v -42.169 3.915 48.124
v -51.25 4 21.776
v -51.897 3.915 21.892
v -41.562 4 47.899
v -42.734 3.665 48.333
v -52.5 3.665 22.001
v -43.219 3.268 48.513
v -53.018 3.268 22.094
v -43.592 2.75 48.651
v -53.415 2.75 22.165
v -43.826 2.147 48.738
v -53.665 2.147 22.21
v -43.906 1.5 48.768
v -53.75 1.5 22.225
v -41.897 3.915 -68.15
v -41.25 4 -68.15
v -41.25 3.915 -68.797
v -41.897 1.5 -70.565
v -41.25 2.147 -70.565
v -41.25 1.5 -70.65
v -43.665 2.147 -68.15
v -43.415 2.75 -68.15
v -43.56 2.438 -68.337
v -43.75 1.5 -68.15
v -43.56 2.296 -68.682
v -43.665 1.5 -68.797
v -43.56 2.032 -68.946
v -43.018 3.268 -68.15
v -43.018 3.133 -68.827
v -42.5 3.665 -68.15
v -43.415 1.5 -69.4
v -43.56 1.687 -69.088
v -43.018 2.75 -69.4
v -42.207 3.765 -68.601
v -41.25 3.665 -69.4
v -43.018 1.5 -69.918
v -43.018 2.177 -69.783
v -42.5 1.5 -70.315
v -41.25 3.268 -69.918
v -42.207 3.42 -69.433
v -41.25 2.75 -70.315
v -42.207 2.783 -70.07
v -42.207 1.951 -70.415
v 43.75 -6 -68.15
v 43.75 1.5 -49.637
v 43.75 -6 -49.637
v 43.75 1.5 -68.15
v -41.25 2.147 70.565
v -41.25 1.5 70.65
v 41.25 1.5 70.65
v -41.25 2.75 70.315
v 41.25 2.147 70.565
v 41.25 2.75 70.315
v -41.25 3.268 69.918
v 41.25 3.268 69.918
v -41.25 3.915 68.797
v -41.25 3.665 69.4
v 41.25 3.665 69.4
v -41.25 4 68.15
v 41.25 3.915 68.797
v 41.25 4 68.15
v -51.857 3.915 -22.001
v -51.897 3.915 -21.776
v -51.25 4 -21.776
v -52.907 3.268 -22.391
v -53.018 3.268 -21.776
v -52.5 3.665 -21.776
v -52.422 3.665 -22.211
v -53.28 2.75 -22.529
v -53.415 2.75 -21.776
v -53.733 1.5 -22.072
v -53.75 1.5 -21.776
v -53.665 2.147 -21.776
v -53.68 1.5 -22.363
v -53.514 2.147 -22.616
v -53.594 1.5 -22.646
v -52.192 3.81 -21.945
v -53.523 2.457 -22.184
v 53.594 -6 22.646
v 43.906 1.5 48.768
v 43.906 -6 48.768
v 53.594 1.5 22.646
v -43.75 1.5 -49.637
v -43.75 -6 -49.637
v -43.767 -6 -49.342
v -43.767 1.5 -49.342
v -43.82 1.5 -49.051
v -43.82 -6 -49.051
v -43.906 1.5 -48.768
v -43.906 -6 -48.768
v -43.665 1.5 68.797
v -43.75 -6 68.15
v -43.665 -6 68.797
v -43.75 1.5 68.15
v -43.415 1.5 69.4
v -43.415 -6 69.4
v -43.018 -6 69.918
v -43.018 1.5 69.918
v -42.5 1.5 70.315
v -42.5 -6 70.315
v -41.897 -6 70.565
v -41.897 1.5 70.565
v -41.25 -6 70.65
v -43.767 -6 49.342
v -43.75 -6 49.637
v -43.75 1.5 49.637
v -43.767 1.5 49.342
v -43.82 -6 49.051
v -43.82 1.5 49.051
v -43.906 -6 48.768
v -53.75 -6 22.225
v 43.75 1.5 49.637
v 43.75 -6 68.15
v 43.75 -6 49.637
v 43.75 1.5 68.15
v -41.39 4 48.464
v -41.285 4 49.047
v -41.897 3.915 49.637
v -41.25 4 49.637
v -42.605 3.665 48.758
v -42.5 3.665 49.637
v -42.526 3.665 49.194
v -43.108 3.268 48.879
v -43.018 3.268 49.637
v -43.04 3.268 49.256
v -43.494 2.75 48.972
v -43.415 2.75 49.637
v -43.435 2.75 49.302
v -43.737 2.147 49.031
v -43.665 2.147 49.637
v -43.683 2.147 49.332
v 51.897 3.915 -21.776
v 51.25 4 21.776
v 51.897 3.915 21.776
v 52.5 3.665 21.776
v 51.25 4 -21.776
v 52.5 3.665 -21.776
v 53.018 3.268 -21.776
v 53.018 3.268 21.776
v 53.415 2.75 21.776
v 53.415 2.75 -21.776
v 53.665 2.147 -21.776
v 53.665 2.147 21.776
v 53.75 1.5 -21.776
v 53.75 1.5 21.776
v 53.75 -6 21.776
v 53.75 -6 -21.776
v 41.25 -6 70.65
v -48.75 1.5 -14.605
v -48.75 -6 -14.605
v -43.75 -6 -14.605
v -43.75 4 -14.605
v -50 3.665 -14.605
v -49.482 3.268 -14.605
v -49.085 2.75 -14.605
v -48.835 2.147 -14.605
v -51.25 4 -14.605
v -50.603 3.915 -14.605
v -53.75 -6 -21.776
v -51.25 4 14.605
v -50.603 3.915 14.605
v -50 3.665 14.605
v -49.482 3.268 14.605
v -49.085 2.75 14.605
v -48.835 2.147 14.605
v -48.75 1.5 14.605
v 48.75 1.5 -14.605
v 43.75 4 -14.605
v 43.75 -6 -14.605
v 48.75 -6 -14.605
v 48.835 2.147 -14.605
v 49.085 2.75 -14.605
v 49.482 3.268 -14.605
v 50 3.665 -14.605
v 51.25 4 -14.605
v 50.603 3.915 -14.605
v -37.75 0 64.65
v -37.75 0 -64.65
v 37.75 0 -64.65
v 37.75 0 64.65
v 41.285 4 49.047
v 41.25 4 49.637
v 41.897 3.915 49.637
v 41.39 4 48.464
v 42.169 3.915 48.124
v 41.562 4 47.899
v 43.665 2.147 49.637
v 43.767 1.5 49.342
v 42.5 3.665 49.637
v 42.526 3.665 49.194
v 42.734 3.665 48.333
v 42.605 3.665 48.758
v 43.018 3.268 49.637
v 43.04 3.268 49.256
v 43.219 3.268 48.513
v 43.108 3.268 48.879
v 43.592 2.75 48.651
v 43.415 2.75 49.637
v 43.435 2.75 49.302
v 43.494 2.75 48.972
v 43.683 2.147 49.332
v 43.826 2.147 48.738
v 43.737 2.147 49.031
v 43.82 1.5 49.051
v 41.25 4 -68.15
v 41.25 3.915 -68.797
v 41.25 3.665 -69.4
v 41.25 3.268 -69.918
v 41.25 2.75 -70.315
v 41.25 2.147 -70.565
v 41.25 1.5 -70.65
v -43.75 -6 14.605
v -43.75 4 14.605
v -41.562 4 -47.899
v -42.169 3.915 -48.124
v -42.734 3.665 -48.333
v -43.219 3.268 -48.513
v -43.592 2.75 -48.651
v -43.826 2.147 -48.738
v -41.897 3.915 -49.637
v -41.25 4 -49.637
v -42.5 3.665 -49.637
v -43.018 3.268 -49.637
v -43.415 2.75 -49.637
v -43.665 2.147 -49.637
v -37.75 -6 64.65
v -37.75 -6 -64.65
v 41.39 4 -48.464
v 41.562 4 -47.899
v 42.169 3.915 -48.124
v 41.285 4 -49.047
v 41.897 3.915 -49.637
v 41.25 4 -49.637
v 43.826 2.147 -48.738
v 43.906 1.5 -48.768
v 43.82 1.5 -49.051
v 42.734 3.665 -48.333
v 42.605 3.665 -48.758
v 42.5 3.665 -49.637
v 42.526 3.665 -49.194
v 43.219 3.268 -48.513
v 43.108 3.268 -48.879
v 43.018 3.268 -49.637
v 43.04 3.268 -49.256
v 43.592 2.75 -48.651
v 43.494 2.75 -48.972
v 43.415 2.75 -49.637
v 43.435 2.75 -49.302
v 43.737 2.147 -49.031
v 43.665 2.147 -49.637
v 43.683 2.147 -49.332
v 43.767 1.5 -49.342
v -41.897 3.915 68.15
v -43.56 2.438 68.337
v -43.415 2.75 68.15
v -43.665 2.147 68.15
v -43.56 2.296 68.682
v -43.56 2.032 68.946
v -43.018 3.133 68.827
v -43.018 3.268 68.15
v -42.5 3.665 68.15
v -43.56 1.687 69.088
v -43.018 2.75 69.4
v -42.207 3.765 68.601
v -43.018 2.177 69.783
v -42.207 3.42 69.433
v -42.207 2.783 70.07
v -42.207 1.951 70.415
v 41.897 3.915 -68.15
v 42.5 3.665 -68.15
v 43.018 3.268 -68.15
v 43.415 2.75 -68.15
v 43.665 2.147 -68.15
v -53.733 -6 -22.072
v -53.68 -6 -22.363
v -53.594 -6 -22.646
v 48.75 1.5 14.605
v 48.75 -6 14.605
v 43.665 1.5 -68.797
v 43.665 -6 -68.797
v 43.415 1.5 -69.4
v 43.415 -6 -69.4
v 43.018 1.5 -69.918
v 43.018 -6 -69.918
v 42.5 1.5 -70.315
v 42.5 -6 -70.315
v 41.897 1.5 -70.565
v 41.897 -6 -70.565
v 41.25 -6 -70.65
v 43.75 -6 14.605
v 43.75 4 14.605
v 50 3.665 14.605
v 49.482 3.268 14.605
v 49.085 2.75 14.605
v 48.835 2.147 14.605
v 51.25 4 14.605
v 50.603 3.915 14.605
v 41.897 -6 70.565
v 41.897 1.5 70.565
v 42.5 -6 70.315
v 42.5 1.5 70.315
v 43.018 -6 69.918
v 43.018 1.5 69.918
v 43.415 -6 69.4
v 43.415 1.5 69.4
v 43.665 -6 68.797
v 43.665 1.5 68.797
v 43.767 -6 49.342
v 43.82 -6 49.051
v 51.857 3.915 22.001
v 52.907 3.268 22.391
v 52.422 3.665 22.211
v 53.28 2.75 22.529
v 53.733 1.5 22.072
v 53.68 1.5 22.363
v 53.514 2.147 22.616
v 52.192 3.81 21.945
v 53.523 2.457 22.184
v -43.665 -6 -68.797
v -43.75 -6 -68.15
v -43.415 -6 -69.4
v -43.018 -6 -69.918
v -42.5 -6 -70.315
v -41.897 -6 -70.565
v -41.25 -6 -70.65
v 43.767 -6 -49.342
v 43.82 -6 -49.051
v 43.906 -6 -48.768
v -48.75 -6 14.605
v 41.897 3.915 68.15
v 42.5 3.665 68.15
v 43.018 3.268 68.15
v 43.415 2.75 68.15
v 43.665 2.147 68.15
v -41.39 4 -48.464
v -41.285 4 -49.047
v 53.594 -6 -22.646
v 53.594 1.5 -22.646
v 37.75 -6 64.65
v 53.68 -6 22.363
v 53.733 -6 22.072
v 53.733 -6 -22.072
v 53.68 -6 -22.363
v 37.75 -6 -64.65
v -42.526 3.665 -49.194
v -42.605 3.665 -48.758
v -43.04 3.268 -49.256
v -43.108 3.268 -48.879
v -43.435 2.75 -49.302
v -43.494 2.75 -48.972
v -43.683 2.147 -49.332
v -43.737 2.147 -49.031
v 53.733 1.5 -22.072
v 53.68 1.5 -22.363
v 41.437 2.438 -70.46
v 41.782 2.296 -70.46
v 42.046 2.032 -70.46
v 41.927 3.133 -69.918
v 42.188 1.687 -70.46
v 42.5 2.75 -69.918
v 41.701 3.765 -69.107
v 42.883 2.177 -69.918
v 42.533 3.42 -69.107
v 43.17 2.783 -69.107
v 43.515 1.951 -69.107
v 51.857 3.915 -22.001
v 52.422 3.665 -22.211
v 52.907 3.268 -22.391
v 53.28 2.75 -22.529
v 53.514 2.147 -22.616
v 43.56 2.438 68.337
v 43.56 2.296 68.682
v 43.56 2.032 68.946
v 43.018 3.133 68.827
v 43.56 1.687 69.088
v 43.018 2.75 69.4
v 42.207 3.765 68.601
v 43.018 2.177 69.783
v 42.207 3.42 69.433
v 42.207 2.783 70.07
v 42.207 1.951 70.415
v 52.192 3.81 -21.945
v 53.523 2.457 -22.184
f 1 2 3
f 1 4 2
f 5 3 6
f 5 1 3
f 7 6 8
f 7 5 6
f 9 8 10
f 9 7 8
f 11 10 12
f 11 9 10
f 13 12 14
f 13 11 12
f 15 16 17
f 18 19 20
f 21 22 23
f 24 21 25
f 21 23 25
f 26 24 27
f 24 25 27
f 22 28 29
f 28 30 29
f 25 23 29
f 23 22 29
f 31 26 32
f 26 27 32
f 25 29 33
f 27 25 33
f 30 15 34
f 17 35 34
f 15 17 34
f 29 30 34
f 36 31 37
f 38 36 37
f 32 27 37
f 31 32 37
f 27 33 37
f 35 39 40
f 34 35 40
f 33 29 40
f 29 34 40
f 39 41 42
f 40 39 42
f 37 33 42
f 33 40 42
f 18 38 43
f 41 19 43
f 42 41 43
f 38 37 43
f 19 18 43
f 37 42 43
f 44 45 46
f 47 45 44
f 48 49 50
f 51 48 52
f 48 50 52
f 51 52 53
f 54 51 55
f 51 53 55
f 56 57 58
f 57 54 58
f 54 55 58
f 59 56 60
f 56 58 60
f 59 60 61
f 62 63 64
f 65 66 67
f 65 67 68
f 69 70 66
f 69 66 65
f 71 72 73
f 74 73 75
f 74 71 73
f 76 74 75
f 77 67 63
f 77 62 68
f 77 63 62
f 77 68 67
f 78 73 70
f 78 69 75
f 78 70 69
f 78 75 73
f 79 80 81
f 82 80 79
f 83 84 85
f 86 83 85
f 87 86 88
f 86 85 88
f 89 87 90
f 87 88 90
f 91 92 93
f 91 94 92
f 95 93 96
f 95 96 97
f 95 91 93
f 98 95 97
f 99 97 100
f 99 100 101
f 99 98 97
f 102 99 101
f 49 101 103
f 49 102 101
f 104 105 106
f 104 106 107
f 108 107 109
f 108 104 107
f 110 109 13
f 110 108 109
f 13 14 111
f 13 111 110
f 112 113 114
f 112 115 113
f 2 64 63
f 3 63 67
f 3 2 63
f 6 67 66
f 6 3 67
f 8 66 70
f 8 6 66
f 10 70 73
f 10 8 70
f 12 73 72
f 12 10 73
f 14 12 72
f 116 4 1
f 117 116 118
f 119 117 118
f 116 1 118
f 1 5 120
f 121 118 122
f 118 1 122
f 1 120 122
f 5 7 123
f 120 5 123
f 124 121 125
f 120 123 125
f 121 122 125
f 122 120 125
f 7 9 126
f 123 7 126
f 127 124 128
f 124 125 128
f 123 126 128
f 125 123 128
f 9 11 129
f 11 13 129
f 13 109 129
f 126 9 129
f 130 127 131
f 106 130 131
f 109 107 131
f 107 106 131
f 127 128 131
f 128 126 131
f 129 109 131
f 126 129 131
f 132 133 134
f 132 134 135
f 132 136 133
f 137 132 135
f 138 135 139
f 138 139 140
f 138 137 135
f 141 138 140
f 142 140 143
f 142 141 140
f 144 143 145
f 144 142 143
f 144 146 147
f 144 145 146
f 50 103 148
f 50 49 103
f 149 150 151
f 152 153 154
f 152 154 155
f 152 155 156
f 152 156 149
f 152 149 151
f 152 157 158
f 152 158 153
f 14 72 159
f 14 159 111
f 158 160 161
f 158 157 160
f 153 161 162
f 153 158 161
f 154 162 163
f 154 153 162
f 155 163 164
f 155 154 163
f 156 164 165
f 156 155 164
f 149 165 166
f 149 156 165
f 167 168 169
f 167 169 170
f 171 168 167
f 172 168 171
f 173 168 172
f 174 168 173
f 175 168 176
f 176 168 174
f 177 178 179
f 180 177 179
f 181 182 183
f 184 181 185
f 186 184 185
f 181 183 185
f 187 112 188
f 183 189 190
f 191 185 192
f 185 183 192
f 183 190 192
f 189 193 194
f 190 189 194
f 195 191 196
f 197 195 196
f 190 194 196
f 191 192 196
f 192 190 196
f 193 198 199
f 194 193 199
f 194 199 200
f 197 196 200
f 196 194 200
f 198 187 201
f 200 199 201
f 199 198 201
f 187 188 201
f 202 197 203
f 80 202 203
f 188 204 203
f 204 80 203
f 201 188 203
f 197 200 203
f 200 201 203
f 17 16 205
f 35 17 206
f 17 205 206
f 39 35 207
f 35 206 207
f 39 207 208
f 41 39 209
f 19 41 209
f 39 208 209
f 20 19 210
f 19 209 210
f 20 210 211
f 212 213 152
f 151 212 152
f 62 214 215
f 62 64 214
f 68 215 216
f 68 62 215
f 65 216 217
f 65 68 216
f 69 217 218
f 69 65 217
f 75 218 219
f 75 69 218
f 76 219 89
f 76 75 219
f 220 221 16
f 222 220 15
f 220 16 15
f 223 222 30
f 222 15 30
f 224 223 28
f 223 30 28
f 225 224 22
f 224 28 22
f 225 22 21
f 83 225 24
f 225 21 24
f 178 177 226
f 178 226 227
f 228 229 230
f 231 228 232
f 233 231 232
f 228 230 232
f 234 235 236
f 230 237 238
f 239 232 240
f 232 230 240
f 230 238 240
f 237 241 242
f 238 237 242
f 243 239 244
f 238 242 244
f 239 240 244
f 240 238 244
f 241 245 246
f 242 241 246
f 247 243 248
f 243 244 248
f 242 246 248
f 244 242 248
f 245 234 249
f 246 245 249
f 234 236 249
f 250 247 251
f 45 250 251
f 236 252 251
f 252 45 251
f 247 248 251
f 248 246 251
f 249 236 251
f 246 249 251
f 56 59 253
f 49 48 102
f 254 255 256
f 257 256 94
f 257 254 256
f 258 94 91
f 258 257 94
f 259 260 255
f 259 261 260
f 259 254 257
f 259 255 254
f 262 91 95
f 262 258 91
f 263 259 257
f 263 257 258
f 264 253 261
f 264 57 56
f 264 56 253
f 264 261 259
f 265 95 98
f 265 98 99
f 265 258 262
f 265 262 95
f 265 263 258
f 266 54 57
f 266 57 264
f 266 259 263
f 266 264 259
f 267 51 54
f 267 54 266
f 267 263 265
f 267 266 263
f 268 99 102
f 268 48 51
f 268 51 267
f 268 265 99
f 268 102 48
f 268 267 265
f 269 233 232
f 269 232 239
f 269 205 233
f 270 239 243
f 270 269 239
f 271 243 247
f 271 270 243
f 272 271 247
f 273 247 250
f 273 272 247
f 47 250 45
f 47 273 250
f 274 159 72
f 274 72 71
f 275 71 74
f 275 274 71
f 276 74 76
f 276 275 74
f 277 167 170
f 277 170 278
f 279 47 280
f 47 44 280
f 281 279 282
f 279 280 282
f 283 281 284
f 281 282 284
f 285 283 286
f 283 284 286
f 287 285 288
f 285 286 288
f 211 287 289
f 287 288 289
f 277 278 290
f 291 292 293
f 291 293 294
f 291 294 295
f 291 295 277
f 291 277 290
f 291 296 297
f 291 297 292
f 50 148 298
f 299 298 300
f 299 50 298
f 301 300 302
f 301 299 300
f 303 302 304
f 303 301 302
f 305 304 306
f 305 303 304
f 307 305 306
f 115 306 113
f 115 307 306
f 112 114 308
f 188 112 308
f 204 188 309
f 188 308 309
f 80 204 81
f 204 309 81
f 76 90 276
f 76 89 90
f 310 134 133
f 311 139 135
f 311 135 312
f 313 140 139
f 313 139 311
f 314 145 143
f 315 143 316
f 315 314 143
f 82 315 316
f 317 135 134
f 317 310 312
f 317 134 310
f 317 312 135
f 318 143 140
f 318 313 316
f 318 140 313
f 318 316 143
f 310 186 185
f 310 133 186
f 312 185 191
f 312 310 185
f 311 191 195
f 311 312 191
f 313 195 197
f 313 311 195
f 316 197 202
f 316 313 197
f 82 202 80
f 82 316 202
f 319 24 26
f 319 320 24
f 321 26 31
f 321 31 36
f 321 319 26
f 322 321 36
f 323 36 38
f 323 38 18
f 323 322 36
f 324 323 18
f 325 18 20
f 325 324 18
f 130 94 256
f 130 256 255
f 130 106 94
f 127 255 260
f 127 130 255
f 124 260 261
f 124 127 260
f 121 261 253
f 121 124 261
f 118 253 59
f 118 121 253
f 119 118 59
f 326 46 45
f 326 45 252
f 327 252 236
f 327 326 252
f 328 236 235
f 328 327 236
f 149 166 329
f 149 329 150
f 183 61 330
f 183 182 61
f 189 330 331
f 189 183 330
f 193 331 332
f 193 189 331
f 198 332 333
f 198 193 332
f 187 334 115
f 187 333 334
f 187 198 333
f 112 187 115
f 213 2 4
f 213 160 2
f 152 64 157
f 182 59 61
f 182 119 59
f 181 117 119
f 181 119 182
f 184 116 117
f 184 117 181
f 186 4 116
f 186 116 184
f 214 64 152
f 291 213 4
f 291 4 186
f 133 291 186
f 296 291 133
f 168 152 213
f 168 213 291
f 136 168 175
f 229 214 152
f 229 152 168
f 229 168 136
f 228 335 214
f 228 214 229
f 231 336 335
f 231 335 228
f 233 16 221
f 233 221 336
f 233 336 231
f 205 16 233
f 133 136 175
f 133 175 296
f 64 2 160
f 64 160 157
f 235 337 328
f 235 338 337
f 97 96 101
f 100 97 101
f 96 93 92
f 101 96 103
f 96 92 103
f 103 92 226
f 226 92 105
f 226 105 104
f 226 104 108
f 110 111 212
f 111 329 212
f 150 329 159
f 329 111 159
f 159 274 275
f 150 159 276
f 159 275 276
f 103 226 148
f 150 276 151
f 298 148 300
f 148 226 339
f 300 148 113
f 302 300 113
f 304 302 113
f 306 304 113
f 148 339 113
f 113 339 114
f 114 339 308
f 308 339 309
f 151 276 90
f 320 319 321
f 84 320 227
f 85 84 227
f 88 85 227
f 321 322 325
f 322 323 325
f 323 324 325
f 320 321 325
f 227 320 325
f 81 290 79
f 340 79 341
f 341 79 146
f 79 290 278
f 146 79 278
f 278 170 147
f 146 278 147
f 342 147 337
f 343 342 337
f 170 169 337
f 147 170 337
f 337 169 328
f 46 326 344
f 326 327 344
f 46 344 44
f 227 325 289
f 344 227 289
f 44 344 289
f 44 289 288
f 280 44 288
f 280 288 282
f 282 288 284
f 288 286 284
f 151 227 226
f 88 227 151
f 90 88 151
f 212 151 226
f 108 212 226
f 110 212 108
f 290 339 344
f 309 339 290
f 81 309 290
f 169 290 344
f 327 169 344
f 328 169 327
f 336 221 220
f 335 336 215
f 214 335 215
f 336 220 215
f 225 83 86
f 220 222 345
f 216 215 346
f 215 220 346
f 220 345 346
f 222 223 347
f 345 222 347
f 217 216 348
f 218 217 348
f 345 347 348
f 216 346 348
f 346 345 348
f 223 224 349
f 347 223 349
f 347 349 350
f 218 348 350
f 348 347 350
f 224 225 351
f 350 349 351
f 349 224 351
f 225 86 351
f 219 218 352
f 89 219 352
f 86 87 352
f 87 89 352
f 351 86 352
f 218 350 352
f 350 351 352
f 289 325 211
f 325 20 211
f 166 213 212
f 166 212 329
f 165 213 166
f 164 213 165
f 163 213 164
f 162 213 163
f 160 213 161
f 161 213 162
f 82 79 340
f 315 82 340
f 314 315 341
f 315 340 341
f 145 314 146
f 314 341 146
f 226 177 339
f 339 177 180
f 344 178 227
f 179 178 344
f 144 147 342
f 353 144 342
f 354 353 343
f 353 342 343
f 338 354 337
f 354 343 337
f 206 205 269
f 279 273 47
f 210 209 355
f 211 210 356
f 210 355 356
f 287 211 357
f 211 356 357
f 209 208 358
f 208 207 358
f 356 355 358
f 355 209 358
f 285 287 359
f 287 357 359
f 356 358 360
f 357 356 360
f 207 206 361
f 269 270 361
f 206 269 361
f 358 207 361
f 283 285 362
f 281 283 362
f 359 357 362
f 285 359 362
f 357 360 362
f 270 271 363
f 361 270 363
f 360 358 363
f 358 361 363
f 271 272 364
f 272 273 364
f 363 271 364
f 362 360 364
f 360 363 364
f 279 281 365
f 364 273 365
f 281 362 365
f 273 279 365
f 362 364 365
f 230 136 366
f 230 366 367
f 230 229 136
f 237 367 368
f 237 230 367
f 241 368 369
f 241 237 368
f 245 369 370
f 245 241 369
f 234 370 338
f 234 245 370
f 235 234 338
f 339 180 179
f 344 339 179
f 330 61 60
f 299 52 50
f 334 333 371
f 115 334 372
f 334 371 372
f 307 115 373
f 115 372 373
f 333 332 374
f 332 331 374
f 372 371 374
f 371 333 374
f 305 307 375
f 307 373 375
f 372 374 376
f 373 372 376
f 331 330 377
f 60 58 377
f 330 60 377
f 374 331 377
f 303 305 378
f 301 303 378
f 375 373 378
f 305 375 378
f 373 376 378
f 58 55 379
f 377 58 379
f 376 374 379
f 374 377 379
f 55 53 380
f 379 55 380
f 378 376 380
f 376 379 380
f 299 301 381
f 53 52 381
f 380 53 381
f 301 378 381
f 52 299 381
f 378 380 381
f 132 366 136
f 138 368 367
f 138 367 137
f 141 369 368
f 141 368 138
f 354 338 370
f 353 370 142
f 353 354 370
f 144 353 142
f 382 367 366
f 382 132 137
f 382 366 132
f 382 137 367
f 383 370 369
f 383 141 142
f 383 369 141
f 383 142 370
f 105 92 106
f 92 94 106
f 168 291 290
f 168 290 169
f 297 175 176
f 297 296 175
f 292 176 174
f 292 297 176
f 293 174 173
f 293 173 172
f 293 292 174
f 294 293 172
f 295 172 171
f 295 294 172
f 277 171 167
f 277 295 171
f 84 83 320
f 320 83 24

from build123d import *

# Parameters (mm, degrees)
SKETCH1_W           = 87.5
SKETCH1_H           = 141.3
BOSS_EXTRUDE1_DEPTH = 4
SKETCH1_3_W         = 87.5
SKETCH1_3_H         = 141.3
SKETCH1_3_W_2       = 75.5
SKETCH1_3_H_2       = 129.3
BOSS_EXTRUDE2_DEPTH = 6
BOSS_EXTRUDE3_DEPTH = 10
FILLET2_R           = 2.5


with BuildPart() as part:
    # Sketch1 → Boss-Extrude1 (new body)
    with BuildSketch(Plane(origin=(0, 0, 0), x_dir=(1, 0, 0), z_dir=(0, 1, 0))):
        Rectangle(SKETCH1_W, SKETCH1_H)
    extrude(amount=BOSS_EXTRUDE1_DEPTH)

    # Sketch1<3> → Boss-Extrude2 (add)
    with BuildSketch(Plane(origin=(0, 0, 0), x_dir=(1, 0, 0), z_dir=(0, 1, 0))):
        Rectangle(SKETCH1_3_W, SKETCH1_3_H)
        Rectangle(SKETCH1_3_W_2, SKETCH1_3_H_2, mode=Mode.SUBTRACT)
    extrude(amount=-BOSS_EXTRUDE2_DEPTH)

    # Sketch2 → Boss-Extrude3 (add)
    with BuildSketch(Plane(origin=(0, 4, 0), x_dir=(1, 0, 0), z_dir=(0, 1, 0))):
        Polygon((-43.75, 49.188592066), (-53.75, 22.225), (-53.75, -22.225), (-43.75, -49.188592066), (-43.75, -22.225), (-43.75, -14.605), (-48.75, -14.605), (-48.75, 14.605), (-43.75, 14.605), (-43.75, 22.225), align=None)
        Polygon((53.75, 22.225), (43.75, 22.225), (43.75, 14.605), (48.75, 14.605), (48.75, -14.605), (43.75, -14.605), (43.75, -22.225), (43.75, -49.188592066), (53.75, -22.225), align=None)
        Polygon((43.75, 49.188592066), (43.75, 22.225), (53.75, 22.225), align=None)
    extrude(amount=-BOSS_EXTRUDE3_DEPTH)

    # Fillet2
    fillet2_edges = [part.edges().sort_by_distance(p)[0] for p in [
        (0, 4, 70.65),
        (43.75, 4, -59.919296033),
        (-43.75, 4, 59.919296033),
        (0, 4, -70.65),
        (-48.75, 4, -35.706796033),
        (-53.75, -1, -22.225),
        (-43.75, -1, -49.188592066),
        (-43.75, -1, 49.188592066),
        (-53.75, 4, 0),
        (-48.75, 4, 35.706796033),
        (-48.75, 4, 0),
        (43.75, 4, 59.919296033),
        (43.75, -1, -49.188592066),
        (53.75, 4, 0),
        (53.75, -1, -22.225),
        (48.75, 4, 35.706796033),
        (53.75, -1, 22.225),
        (43.75, -1, 49.188592066),
        (48.75, 4, 0),
        (-43.75, 4, -59.919296033),
        (48.75, 4, -35.706796033),
        (43.75, -1, -70.65),
        (43.75, -1, 70.65),
        (-43.75, -1, 70.65),
        (-43.75, -1, -70.65),
    ]]
    fillet(fillet2_edges, radius=FILLET2_R - 0.0001)  # a hair under: the kernel refuses the full size


solid = part.part
